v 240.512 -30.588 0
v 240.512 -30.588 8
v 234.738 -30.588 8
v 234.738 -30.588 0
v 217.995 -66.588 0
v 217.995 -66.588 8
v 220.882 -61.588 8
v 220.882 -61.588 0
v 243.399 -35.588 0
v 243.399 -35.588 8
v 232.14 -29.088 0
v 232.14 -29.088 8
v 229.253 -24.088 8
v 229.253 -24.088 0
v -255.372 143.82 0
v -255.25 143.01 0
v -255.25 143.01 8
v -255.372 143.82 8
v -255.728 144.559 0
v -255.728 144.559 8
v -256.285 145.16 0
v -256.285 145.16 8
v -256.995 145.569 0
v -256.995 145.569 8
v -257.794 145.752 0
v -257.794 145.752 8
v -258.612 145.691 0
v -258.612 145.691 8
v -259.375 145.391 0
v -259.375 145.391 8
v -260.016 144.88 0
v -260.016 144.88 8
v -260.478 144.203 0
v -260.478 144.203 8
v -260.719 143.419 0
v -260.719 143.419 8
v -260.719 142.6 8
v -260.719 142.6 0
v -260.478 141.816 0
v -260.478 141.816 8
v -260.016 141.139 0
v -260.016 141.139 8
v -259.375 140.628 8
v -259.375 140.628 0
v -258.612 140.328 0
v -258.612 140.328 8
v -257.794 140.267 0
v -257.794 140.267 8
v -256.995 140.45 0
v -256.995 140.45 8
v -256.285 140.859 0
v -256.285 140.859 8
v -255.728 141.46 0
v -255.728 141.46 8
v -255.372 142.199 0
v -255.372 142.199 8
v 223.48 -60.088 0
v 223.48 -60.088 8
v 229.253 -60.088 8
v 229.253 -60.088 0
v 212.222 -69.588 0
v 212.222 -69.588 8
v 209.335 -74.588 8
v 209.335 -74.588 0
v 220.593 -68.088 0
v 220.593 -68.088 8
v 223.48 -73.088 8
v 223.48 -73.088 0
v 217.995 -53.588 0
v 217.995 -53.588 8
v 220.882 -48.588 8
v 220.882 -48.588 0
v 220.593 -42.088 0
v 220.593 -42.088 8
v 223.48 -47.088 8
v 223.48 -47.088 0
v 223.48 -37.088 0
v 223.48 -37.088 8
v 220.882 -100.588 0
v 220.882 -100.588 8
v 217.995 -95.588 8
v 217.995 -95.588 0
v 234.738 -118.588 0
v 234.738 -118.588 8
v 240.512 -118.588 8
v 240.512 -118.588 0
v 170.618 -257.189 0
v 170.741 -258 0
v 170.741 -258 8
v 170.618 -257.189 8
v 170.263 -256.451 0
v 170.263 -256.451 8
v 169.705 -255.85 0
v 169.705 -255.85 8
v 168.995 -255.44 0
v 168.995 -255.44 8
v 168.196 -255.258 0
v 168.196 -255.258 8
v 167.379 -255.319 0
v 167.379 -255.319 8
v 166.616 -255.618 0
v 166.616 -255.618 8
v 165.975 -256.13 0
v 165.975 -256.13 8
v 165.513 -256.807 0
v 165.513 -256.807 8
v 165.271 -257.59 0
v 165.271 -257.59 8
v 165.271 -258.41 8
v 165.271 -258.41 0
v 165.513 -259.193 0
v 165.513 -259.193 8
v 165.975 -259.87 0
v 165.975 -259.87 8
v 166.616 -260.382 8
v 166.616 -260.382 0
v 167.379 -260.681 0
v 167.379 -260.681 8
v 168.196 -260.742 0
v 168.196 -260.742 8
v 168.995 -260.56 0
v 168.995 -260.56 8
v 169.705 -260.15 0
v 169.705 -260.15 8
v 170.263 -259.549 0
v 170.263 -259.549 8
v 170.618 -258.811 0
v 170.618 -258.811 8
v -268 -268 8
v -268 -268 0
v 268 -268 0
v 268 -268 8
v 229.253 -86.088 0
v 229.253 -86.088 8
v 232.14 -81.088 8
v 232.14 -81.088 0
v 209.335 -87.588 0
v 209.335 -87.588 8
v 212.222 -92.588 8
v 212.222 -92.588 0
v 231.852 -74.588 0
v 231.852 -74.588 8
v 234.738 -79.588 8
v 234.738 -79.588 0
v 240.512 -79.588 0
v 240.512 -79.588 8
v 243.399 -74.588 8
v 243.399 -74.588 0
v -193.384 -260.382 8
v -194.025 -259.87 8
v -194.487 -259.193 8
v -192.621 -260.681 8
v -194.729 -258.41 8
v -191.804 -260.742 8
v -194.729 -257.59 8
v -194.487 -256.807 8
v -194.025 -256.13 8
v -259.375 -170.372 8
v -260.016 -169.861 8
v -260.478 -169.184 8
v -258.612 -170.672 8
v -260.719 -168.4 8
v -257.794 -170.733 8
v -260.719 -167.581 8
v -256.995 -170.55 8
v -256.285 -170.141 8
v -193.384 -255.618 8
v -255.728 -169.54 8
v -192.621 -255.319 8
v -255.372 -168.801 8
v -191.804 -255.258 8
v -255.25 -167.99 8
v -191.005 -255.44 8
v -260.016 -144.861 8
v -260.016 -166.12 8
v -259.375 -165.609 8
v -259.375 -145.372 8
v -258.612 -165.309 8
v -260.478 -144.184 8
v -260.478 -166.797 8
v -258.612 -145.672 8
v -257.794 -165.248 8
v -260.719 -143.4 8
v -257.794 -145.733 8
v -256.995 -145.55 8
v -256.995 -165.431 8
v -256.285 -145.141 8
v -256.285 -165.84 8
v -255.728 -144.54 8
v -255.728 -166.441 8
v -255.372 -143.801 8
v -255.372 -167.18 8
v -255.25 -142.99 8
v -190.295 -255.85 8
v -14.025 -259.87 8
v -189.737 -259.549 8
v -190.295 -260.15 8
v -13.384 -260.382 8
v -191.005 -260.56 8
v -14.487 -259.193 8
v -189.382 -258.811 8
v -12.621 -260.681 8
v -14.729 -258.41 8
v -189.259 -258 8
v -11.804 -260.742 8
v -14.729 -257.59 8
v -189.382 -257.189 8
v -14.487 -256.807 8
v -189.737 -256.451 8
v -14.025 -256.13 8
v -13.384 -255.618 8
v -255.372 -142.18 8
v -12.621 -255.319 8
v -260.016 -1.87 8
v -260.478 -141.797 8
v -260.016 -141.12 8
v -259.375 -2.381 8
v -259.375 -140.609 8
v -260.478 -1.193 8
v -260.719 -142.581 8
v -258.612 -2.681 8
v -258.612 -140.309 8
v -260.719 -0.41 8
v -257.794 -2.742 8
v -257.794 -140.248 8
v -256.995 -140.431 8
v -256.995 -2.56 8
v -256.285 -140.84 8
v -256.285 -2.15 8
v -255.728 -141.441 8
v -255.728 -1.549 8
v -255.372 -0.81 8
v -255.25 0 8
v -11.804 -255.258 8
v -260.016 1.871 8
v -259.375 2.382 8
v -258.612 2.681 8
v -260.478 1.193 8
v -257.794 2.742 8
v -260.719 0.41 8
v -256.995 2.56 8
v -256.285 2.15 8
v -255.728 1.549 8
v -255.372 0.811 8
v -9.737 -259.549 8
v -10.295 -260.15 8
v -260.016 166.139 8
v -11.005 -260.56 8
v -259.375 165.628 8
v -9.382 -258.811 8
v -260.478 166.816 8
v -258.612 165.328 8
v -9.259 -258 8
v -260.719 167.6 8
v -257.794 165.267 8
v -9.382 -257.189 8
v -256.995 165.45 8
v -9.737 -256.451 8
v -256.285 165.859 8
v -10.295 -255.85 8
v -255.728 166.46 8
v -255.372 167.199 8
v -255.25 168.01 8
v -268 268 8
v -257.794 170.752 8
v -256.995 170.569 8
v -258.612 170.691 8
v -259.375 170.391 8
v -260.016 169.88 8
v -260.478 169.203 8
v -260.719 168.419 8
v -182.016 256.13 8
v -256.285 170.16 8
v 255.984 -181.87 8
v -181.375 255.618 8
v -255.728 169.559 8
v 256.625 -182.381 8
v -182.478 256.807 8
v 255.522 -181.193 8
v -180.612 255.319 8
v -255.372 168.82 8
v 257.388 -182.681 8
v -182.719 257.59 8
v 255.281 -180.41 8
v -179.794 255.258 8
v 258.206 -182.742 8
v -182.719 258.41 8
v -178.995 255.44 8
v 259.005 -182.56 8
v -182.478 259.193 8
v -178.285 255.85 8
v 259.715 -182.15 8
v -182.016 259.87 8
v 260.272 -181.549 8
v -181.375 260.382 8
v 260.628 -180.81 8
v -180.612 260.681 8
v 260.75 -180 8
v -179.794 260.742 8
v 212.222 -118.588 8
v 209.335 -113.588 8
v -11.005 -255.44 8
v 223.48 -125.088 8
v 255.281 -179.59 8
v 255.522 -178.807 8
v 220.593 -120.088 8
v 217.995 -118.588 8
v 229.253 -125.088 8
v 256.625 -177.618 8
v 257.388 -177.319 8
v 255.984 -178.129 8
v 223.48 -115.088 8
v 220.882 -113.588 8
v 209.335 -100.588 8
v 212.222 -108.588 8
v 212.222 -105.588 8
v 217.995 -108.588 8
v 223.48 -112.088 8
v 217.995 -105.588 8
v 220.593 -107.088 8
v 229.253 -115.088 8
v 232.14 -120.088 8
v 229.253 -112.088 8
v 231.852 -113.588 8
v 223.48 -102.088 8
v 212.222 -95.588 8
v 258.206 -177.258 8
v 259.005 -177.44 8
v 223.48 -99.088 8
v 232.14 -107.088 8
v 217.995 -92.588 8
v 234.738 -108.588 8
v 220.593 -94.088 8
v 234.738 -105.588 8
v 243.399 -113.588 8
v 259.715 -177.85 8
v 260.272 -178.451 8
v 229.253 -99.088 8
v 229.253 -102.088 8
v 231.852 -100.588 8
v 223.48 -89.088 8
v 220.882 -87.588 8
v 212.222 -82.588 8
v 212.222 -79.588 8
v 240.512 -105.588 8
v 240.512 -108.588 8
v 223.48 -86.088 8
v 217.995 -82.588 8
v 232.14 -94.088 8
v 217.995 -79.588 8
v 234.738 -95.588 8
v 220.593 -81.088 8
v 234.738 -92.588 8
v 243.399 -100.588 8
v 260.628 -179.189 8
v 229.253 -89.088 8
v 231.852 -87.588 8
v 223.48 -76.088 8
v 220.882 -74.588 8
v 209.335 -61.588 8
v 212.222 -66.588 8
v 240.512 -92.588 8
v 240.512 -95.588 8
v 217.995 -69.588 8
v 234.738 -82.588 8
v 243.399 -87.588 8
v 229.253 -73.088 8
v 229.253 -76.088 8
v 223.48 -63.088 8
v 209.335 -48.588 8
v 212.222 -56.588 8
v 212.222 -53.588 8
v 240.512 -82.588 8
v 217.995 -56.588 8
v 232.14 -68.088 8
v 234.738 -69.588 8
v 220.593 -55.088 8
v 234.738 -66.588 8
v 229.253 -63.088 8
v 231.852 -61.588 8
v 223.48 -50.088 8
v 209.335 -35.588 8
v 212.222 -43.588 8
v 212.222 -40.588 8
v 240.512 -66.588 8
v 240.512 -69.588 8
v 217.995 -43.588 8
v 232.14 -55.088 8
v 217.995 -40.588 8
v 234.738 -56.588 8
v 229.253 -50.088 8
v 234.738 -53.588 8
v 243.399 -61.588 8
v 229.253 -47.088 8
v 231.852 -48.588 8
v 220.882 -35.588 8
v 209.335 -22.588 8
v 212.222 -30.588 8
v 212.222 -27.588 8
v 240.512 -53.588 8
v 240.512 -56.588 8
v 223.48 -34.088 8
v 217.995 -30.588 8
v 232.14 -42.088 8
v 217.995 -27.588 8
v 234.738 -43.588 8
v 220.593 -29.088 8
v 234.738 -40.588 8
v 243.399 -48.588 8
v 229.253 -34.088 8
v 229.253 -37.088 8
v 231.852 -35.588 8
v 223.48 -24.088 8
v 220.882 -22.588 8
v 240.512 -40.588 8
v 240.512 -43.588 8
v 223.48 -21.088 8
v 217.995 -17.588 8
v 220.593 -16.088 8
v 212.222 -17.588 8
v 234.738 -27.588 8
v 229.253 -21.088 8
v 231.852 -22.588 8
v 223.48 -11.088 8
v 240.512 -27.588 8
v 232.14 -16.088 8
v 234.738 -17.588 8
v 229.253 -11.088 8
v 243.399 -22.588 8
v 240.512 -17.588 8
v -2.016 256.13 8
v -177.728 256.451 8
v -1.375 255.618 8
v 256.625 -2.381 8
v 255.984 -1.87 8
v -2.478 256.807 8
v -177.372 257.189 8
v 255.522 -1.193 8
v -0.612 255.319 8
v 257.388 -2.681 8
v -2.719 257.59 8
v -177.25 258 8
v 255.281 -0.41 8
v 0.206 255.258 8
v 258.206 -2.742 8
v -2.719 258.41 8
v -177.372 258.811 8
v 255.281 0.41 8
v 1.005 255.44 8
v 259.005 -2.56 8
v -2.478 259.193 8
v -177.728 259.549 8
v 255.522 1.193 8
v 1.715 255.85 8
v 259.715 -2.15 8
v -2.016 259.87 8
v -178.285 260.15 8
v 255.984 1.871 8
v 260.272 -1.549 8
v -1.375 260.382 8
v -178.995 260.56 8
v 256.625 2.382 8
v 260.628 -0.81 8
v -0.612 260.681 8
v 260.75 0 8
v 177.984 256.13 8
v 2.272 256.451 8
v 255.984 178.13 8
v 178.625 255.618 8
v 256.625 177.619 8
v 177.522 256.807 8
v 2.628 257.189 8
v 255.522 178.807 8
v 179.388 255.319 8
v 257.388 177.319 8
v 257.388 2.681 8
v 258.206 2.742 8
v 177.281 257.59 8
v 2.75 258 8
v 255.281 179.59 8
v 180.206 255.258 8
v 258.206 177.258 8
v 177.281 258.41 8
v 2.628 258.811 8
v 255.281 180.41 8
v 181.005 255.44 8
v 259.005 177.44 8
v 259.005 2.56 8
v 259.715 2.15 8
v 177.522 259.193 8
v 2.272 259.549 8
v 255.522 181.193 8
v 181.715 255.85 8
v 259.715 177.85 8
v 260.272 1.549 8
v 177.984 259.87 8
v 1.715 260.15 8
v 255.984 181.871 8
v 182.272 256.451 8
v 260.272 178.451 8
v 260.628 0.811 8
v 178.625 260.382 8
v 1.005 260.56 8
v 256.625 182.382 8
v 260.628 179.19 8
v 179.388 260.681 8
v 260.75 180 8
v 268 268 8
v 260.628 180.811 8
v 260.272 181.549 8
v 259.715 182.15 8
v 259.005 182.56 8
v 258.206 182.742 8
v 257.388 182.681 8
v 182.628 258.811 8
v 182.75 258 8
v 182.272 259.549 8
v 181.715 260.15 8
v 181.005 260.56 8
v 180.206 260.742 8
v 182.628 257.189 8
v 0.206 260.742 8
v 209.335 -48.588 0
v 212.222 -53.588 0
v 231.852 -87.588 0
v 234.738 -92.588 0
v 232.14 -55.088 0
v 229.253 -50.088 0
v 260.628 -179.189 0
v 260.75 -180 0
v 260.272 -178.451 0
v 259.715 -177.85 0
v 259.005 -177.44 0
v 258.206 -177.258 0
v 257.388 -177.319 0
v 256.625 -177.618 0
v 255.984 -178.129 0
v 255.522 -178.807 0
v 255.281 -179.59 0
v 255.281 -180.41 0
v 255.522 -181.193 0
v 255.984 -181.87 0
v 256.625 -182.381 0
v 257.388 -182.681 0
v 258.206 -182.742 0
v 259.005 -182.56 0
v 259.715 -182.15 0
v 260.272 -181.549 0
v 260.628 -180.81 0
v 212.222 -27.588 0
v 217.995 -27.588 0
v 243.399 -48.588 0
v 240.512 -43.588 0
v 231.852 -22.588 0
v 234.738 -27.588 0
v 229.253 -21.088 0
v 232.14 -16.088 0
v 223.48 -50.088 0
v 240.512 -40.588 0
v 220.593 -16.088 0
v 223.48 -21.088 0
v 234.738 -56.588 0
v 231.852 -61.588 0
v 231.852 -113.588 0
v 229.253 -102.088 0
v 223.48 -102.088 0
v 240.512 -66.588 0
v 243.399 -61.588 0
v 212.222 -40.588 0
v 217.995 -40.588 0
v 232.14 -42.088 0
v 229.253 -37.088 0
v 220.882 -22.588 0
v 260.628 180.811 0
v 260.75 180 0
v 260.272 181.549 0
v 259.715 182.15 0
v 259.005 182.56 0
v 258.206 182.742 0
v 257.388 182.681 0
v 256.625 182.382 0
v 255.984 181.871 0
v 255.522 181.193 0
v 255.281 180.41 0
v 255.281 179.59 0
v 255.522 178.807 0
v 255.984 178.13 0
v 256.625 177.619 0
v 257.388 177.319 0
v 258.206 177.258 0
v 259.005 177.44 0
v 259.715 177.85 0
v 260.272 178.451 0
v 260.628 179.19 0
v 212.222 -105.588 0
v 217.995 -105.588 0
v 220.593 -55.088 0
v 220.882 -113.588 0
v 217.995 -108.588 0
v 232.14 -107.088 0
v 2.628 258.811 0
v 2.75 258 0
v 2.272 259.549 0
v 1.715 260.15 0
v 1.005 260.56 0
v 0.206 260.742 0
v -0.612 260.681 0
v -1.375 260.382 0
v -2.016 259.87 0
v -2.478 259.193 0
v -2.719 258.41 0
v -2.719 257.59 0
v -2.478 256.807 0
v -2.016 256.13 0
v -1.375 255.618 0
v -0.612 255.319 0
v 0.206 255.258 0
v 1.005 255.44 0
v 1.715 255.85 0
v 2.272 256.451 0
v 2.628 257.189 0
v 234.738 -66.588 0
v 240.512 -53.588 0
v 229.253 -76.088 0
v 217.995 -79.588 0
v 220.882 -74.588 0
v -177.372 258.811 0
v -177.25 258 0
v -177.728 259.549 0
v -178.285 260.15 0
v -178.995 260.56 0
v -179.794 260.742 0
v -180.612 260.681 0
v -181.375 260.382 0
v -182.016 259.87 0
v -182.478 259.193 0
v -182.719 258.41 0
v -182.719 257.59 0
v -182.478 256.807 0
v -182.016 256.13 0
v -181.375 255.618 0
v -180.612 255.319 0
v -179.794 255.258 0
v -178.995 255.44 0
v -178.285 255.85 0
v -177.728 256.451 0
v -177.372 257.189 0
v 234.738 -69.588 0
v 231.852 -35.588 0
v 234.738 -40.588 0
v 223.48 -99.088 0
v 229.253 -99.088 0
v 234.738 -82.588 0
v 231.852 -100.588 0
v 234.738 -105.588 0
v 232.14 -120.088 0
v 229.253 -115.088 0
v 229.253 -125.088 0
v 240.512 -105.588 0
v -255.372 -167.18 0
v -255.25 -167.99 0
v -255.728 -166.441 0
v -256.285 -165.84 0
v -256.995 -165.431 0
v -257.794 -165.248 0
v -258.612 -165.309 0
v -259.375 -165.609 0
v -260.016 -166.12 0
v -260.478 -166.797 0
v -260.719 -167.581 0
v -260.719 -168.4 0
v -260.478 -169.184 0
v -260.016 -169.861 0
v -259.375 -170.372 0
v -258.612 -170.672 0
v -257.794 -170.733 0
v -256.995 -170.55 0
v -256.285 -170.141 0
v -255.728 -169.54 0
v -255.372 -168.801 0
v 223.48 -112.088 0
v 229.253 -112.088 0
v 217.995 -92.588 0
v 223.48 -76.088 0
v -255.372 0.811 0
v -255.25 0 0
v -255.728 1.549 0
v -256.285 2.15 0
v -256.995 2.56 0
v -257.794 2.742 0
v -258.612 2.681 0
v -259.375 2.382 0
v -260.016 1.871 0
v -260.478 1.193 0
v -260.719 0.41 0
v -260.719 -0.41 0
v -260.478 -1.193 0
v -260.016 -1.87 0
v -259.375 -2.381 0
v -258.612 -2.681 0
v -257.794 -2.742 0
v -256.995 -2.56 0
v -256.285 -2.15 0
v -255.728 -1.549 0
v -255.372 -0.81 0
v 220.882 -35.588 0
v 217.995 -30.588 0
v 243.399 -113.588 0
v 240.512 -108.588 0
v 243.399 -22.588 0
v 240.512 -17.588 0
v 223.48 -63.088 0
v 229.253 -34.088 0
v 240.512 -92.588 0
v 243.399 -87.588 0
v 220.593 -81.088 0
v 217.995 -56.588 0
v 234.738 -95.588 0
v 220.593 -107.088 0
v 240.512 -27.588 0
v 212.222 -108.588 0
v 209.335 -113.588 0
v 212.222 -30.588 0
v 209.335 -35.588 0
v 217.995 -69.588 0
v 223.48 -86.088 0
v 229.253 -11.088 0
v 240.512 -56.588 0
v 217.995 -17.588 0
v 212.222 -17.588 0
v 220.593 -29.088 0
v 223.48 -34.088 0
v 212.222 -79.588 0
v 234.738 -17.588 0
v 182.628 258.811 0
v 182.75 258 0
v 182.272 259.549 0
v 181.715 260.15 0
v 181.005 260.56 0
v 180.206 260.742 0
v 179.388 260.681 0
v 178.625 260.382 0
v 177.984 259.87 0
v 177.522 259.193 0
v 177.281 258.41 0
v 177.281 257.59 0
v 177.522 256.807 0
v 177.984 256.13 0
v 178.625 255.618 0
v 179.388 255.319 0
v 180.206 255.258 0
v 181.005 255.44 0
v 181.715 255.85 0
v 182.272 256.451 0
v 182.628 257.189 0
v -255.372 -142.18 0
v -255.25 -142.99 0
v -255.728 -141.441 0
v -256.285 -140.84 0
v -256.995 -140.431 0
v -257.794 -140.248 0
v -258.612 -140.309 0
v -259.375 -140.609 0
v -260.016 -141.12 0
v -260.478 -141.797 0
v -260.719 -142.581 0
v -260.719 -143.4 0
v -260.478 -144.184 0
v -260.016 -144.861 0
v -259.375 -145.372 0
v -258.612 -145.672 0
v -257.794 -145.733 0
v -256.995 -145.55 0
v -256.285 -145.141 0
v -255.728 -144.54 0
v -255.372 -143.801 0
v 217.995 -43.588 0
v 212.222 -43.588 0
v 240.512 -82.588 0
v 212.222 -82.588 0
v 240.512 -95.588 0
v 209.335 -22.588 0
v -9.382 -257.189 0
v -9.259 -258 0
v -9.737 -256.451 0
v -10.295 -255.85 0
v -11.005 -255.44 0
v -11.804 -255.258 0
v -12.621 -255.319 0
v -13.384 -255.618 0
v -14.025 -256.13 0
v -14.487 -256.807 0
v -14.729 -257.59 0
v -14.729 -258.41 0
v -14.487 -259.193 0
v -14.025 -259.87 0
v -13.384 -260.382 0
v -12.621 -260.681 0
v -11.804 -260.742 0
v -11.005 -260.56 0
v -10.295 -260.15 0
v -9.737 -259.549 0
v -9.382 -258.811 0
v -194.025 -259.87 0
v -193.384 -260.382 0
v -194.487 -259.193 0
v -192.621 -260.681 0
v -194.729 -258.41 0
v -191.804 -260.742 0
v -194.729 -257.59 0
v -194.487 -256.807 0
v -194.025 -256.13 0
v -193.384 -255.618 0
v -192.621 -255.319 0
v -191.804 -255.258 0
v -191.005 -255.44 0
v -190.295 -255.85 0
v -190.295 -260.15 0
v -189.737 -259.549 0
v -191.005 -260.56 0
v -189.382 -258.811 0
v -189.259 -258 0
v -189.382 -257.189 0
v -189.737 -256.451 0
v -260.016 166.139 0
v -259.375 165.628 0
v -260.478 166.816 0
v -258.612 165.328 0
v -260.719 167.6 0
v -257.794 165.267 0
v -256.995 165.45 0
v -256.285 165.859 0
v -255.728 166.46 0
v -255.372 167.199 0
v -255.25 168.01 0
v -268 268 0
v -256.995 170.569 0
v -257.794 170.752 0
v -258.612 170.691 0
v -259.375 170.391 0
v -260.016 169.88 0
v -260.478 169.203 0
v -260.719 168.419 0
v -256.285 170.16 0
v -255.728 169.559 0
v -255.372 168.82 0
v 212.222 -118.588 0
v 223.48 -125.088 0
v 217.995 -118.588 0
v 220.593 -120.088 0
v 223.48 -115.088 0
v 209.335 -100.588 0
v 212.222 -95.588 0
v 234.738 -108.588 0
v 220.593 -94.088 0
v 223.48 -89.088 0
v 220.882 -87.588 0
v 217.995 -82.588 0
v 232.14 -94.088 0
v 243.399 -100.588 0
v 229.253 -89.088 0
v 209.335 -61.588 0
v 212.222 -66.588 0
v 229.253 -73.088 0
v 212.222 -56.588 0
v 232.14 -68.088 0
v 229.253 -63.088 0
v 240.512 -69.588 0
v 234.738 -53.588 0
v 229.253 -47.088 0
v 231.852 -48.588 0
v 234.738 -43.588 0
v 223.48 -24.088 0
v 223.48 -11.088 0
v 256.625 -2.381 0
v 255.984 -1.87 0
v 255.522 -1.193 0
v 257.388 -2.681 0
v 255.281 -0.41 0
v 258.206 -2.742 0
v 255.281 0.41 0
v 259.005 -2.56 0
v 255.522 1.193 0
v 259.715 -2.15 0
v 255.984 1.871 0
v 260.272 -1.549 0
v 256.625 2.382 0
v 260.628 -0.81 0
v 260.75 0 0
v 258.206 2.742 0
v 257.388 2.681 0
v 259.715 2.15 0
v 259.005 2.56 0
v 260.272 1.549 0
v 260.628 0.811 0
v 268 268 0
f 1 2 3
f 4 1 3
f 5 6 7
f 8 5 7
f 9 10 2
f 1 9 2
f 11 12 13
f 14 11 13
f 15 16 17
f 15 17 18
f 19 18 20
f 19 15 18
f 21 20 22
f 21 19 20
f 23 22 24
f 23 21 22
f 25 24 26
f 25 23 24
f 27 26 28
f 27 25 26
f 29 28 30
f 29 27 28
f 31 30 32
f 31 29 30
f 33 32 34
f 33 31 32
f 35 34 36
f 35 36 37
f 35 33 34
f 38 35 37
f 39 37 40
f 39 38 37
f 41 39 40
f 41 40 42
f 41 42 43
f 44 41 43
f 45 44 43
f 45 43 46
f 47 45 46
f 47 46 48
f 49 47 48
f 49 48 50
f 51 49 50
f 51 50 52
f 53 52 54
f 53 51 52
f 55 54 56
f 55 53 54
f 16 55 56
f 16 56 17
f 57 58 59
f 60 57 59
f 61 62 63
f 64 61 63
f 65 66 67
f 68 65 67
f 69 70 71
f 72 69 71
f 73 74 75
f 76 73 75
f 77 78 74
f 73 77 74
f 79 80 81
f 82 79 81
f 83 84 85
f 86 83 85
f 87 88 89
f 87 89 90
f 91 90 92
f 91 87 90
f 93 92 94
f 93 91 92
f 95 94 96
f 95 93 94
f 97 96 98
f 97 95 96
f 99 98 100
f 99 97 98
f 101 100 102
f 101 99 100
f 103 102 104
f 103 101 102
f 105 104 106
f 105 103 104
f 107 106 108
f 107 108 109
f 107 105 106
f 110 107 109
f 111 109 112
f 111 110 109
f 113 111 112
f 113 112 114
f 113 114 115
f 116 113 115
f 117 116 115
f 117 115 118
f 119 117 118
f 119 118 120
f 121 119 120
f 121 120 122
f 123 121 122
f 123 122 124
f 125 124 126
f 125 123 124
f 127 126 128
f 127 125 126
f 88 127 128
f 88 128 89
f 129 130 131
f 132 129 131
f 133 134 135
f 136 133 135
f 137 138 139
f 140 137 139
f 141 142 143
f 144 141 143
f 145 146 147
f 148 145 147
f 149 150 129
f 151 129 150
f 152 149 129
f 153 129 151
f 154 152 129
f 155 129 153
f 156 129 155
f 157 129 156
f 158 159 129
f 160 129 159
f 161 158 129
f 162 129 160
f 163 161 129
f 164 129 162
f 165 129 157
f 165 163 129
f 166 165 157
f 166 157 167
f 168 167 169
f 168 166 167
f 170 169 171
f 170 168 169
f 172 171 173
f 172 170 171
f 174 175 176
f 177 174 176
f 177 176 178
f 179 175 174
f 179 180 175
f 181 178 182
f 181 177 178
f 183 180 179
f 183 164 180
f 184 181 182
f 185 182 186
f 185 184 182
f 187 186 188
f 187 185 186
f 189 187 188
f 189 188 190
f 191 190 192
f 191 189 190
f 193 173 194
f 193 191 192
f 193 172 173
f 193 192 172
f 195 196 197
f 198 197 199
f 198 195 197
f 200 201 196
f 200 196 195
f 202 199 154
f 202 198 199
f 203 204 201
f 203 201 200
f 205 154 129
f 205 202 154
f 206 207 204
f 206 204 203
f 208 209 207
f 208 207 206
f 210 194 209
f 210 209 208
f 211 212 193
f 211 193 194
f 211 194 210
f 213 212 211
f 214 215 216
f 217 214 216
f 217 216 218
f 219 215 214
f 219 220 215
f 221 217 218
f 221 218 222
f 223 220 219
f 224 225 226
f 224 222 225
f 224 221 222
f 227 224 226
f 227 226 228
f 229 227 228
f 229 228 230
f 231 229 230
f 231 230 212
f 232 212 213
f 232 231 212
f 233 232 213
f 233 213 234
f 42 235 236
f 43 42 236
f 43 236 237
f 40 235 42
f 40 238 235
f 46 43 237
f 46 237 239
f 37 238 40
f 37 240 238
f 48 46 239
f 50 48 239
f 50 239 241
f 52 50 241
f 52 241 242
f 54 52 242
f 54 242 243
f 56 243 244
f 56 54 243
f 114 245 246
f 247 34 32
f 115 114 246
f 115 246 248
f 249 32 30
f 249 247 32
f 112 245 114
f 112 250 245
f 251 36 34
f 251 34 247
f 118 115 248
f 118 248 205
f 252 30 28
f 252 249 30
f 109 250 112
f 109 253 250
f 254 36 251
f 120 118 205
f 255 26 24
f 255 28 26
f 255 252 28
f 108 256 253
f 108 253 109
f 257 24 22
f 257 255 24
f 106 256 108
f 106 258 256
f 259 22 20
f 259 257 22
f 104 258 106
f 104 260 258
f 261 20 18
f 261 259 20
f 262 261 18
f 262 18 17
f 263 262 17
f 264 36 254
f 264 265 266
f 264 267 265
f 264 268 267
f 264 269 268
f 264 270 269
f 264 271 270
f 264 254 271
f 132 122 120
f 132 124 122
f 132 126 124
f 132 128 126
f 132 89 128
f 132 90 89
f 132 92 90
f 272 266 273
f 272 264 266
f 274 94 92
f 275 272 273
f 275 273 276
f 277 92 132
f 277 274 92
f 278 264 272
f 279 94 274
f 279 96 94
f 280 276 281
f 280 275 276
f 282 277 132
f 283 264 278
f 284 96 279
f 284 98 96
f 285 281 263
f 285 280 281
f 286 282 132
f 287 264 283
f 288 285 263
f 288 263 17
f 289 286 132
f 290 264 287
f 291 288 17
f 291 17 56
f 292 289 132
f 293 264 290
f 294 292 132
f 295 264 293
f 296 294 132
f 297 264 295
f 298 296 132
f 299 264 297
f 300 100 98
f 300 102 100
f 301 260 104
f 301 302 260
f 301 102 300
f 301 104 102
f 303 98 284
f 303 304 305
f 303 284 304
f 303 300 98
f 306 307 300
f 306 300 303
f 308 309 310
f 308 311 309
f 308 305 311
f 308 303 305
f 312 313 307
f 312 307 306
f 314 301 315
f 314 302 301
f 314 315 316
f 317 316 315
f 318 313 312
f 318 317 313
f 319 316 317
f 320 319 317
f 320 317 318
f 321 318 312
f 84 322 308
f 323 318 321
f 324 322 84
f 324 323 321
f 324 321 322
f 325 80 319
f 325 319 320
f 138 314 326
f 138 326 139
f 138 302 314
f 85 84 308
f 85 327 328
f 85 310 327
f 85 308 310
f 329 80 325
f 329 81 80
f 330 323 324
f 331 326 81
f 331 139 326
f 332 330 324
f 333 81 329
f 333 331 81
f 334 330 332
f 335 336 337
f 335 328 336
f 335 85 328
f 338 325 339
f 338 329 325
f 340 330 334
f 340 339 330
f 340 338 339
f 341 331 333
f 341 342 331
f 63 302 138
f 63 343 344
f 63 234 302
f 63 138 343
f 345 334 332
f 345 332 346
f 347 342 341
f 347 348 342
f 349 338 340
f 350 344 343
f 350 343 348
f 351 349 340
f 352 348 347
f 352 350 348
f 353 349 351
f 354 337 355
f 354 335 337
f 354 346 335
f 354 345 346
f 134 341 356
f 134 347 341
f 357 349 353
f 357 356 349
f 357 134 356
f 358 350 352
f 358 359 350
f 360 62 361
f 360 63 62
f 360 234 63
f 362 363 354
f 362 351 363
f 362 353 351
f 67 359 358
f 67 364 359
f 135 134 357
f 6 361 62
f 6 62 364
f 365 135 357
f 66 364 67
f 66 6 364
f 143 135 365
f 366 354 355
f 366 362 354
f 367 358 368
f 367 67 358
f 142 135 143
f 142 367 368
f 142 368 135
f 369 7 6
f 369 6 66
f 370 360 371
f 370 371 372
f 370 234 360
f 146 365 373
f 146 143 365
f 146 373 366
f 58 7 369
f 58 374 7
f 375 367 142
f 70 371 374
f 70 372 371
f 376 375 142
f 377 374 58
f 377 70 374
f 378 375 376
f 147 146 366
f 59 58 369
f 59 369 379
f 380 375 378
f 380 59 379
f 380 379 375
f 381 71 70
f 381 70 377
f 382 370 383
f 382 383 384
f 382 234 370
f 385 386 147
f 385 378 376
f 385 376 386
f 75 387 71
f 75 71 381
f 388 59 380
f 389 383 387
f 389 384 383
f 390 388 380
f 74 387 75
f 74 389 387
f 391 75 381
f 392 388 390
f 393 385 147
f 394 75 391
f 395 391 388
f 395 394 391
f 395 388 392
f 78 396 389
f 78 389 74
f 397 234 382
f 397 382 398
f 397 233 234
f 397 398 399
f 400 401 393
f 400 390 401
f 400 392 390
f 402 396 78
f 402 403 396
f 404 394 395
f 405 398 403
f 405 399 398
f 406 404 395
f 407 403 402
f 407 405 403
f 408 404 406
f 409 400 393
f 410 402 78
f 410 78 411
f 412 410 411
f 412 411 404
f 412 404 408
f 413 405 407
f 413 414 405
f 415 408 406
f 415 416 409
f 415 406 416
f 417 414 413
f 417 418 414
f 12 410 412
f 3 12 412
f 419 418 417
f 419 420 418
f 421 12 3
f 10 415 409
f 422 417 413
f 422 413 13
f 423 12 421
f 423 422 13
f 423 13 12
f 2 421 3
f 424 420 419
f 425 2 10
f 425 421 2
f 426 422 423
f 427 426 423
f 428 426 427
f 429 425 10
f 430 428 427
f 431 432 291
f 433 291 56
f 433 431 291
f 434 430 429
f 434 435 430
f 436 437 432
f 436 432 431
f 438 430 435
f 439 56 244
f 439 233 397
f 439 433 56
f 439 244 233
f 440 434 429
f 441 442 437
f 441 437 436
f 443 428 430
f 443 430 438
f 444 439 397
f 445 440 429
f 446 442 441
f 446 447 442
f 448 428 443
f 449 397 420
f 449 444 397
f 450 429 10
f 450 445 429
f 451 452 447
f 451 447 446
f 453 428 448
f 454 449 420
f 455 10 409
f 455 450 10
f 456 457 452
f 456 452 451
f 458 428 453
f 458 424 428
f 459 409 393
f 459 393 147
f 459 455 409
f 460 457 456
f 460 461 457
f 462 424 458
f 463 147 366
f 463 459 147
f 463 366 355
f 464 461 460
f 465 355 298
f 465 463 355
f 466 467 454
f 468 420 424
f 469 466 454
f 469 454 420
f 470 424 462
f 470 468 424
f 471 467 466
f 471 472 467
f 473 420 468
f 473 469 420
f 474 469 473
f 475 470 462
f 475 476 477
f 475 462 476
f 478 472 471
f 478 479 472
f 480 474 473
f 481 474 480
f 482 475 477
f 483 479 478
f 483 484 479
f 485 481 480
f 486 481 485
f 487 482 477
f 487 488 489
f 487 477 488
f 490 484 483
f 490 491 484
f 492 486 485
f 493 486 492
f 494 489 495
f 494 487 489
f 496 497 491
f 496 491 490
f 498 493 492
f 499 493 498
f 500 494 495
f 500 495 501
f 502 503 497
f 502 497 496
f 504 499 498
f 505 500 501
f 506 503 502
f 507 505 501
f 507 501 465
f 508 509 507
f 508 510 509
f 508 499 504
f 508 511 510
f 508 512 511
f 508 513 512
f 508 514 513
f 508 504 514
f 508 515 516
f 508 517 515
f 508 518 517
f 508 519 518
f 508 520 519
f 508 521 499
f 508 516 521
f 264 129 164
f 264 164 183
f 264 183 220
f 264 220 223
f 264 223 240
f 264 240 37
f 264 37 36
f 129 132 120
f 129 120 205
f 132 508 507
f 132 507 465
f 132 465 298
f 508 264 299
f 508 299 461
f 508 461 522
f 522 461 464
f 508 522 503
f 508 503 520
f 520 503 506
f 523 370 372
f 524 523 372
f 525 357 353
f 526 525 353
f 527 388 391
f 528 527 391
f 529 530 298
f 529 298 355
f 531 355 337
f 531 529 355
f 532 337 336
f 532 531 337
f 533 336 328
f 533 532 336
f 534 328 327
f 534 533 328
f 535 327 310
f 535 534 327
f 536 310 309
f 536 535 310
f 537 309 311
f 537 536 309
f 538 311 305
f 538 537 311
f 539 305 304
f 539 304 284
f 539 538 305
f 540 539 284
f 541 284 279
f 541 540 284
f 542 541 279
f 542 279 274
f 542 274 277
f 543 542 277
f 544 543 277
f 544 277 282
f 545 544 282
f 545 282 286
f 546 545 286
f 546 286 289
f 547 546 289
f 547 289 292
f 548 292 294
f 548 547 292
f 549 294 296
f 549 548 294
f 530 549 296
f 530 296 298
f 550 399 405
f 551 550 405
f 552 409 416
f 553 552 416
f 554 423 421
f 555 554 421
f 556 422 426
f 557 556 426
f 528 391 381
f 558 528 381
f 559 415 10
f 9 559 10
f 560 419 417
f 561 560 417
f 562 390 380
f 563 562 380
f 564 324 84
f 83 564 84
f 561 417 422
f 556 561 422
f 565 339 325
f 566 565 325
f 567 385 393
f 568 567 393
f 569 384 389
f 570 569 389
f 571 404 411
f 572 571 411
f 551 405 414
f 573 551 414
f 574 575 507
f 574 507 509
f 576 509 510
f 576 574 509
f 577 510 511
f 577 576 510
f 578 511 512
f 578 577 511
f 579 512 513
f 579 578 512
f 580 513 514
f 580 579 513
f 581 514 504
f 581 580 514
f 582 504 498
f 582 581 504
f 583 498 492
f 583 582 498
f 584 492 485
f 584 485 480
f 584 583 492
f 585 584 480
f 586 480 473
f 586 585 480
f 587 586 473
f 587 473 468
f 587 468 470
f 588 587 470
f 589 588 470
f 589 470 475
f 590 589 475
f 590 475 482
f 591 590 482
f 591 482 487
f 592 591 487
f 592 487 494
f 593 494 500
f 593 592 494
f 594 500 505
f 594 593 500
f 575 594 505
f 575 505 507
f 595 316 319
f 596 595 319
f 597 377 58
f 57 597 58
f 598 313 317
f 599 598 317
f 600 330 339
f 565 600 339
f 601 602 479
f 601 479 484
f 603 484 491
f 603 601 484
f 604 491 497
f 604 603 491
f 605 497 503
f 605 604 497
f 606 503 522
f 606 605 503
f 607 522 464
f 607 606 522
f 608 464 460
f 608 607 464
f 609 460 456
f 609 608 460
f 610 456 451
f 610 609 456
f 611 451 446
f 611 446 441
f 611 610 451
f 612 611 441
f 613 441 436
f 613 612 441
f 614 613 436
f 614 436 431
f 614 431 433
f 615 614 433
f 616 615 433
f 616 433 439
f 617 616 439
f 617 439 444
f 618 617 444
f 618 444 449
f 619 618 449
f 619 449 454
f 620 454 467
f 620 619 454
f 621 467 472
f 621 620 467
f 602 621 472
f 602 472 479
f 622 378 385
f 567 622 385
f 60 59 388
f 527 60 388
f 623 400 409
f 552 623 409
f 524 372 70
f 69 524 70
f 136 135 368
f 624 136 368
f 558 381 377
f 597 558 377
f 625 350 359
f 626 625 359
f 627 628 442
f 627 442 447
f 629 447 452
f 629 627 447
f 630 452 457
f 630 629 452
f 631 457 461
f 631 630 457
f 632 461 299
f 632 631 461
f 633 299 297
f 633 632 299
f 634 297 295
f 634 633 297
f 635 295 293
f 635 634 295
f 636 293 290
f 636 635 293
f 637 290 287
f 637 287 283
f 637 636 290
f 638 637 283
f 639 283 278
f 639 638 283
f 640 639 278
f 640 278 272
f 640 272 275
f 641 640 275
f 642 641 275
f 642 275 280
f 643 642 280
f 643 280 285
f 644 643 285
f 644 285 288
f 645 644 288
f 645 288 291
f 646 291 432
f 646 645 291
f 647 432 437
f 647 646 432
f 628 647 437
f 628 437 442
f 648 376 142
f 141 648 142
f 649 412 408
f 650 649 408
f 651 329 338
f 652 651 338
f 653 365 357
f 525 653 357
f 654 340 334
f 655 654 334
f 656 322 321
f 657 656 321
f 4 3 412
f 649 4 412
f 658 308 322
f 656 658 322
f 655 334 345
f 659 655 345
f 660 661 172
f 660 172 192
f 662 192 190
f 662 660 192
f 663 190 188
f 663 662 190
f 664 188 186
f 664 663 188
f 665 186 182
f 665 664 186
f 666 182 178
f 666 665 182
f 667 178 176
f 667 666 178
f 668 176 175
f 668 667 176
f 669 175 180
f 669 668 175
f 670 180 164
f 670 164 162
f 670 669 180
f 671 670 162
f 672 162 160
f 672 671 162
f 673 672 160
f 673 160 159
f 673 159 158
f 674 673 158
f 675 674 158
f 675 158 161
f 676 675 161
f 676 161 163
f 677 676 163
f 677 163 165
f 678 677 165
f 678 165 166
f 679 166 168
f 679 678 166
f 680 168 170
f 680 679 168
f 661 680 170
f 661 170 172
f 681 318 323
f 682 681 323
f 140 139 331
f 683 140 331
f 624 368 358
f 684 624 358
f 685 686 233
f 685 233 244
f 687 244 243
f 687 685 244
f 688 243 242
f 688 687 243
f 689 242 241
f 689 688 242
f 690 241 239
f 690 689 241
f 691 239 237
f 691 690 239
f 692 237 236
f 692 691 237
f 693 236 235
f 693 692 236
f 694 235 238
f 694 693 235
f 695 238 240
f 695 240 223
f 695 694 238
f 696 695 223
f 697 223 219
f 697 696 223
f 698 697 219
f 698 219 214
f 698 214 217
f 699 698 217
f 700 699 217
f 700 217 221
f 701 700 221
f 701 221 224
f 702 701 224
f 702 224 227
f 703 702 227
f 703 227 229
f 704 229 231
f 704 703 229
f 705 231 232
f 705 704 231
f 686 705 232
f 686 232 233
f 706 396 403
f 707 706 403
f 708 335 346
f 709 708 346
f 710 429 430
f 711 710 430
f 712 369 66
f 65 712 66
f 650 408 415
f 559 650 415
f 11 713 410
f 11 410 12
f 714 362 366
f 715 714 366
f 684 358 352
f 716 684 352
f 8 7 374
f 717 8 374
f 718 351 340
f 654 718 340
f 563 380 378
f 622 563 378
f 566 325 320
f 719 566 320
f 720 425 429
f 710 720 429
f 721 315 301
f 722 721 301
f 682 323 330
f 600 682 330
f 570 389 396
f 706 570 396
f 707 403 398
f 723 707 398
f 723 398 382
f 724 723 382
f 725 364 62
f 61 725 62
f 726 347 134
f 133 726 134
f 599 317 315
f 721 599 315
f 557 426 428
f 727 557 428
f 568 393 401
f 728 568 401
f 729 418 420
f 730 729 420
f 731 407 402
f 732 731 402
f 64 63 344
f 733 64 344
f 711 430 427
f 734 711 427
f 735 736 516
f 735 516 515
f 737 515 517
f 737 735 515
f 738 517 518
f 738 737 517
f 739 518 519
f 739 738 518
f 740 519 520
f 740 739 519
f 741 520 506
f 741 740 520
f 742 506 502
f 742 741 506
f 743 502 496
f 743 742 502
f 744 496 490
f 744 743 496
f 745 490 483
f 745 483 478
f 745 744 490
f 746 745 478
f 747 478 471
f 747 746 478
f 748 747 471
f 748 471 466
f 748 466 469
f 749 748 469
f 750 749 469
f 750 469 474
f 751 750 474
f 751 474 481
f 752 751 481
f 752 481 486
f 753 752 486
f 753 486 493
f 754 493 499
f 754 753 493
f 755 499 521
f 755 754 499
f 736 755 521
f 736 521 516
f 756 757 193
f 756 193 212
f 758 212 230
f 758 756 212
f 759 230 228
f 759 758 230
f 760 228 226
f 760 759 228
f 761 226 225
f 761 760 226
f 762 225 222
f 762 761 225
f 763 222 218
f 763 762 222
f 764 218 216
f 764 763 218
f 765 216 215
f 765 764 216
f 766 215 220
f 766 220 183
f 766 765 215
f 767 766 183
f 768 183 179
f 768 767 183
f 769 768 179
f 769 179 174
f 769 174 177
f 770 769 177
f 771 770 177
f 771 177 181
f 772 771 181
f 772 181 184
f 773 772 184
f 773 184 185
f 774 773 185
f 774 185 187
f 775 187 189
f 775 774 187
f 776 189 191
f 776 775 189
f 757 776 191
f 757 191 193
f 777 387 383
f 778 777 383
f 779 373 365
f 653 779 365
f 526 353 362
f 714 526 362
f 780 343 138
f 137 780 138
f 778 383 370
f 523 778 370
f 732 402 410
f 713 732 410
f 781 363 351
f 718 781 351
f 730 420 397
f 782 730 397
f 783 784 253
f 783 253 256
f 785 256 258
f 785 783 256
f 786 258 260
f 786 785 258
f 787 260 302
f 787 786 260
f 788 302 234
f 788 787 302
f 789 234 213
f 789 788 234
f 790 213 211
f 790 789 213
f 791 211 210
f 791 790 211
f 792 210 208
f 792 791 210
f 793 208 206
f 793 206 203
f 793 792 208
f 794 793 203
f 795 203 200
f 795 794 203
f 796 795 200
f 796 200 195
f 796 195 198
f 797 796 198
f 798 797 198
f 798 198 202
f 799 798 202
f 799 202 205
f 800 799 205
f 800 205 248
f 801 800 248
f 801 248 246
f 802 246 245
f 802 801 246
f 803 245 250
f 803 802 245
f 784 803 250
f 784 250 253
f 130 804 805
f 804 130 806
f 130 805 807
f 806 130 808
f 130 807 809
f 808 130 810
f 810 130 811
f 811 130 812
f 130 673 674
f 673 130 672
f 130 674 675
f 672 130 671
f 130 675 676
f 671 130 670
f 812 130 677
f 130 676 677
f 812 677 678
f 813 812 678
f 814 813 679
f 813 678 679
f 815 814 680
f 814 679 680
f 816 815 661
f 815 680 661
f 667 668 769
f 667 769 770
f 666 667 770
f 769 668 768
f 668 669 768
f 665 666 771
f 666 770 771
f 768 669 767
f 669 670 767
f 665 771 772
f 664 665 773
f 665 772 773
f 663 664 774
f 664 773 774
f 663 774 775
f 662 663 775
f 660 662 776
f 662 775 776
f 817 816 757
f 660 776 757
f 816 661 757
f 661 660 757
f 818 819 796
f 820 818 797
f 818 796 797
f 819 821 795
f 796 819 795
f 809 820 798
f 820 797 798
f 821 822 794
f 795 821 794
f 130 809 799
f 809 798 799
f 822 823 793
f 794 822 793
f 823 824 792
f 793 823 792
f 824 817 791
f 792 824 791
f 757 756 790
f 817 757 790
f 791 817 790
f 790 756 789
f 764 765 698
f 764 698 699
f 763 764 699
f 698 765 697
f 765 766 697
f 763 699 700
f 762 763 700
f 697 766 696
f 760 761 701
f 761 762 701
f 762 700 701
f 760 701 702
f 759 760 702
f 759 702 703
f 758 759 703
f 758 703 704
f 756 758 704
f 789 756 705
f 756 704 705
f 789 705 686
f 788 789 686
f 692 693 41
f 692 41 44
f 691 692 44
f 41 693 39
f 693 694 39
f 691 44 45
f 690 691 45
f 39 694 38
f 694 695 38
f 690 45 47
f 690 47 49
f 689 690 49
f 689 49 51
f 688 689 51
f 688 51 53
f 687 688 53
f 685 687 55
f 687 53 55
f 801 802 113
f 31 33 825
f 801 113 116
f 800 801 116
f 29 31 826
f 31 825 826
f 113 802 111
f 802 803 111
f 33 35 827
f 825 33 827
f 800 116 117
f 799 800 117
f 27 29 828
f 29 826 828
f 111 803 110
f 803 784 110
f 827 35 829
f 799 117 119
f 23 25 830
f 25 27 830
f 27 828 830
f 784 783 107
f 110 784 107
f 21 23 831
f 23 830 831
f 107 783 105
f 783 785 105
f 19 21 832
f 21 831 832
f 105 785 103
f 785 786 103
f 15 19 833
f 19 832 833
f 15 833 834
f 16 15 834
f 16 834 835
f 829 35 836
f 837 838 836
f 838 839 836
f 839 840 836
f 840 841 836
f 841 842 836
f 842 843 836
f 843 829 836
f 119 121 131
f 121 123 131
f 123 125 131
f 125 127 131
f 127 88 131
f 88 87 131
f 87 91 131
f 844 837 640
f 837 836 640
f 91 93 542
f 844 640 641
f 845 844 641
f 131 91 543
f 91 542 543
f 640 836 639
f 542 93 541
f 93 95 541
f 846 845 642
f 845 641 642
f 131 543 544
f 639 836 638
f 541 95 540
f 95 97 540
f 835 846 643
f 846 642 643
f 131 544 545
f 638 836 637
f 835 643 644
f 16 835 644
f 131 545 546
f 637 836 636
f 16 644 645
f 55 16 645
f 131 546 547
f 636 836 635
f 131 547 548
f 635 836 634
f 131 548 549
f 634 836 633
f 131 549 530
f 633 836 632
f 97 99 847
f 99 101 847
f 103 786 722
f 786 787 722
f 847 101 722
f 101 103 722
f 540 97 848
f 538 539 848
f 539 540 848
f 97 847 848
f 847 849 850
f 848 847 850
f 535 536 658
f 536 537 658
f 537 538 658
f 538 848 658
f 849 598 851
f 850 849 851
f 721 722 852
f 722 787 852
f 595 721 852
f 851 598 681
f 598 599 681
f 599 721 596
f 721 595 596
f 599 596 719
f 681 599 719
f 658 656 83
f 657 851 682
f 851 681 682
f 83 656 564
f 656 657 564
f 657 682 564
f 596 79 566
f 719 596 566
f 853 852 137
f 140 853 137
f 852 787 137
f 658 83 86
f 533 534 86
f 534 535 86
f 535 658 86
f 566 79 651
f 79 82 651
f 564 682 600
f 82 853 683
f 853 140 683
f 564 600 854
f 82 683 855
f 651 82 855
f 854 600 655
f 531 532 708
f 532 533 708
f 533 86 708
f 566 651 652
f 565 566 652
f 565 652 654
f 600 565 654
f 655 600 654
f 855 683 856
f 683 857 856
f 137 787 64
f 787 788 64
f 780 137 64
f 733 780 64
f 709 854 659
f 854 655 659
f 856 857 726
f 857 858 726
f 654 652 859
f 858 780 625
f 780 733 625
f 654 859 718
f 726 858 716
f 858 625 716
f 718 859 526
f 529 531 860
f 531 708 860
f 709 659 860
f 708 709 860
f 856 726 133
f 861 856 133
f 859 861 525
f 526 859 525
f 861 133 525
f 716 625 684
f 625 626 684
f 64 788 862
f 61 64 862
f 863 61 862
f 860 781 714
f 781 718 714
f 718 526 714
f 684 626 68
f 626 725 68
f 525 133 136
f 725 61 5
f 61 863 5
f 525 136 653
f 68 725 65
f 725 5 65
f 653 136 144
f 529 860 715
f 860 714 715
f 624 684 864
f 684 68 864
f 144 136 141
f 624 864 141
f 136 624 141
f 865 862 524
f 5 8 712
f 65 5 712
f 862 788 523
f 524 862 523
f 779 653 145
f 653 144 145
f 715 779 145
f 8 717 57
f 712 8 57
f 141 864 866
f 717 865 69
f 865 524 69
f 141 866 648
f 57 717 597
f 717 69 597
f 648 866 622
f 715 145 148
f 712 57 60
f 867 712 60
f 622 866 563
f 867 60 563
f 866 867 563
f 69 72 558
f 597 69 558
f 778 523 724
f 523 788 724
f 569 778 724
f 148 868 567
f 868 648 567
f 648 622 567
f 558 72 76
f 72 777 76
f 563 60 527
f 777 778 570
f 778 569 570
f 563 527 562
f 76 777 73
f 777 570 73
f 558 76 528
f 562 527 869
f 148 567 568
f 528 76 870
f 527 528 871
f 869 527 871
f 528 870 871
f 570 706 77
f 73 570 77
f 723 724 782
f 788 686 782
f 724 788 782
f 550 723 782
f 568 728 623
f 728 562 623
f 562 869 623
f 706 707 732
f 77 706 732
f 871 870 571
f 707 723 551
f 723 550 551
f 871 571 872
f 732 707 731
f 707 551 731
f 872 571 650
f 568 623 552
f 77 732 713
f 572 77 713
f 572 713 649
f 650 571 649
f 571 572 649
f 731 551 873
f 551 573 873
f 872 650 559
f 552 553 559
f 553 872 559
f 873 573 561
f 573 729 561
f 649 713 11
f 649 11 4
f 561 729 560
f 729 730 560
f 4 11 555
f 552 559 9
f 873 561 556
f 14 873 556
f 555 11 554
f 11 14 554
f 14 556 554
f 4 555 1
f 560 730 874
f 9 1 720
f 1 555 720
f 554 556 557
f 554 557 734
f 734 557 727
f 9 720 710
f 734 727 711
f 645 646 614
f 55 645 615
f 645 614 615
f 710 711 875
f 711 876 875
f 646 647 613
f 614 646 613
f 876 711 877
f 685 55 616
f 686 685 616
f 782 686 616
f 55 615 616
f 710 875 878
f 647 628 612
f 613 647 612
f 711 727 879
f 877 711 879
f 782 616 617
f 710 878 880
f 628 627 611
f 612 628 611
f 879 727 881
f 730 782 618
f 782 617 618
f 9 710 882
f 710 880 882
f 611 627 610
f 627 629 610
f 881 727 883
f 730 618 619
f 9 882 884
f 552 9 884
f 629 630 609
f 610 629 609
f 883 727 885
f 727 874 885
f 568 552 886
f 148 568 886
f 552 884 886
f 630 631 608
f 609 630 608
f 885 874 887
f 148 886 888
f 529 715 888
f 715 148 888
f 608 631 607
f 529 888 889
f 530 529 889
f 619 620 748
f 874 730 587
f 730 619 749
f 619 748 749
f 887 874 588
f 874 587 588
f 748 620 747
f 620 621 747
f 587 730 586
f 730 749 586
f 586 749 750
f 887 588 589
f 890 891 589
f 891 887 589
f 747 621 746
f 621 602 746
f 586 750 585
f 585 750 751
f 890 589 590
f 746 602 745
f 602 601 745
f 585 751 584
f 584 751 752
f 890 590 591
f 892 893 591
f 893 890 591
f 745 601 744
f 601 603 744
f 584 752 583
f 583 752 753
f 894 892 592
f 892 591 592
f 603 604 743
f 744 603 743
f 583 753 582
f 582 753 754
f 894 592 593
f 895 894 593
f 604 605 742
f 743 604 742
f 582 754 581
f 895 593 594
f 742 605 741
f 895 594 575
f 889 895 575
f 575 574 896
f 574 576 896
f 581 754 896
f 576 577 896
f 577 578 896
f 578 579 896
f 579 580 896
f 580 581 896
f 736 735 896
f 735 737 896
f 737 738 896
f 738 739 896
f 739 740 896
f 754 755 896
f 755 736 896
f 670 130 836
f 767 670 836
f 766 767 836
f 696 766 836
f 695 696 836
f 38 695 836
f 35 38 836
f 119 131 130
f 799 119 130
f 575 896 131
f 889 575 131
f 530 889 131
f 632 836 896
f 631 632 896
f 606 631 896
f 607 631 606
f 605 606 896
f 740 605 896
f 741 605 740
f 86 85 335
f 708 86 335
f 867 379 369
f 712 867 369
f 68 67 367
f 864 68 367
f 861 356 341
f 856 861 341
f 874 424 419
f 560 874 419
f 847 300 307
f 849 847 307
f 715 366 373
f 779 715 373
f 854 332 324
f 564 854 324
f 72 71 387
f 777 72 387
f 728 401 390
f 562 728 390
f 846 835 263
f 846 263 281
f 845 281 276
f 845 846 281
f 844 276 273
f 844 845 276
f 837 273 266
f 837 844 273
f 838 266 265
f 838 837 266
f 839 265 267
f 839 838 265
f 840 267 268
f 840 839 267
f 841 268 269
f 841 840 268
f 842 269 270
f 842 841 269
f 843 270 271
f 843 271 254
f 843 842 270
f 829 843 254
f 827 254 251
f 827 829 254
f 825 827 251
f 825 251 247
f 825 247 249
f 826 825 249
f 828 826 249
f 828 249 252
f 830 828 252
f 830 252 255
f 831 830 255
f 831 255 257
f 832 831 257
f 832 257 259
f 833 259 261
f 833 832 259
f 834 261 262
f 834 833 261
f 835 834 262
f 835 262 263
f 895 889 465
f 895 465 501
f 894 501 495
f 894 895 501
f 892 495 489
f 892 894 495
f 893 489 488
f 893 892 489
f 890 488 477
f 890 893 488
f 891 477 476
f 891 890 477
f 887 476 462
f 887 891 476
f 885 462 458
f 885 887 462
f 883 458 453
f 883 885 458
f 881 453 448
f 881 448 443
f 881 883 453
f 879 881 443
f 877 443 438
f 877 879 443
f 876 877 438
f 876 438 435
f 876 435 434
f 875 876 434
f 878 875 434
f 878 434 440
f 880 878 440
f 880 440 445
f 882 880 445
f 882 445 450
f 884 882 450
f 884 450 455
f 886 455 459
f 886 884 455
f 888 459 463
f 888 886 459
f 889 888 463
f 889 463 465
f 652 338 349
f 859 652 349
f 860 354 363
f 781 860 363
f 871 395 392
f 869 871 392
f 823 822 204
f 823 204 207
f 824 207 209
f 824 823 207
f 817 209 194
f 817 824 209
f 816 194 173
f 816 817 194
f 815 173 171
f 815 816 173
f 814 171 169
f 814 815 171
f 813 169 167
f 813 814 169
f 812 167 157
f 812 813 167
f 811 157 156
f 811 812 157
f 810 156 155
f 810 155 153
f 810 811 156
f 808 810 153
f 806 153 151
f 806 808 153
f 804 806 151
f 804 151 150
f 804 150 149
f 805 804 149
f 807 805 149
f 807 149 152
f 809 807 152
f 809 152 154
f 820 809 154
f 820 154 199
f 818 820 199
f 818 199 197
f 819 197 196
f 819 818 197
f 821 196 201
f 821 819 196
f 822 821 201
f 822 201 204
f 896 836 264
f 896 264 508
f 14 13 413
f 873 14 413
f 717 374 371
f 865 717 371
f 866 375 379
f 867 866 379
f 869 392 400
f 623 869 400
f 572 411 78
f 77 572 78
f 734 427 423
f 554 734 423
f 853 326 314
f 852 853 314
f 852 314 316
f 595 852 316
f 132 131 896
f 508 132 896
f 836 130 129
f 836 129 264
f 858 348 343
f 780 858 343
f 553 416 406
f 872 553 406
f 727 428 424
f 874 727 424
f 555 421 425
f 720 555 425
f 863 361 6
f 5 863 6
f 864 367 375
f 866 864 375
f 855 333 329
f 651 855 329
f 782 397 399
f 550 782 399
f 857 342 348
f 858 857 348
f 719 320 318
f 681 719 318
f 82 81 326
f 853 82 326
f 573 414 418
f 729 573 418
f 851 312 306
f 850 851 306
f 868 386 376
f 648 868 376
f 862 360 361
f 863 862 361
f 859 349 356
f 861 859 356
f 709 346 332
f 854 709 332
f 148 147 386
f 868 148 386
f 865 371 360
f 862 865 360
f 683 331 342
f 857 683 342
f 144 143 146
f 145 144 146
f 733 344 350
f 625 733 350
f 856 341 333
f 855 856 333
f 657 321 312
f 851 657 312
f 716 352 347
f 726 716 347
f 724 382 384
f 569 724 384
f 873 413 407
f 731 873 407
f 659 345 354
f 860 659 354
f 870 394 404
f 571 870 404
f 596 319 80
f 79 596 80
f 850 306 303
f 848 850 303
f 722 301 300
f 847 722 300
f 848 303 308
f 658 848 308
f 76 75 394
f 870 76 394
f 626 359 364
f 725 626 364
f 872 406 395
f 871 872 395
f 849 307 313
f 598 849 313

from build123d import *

# Parameters (mm, degrees)
SKETCH1_W           = 536
SKETCH1_H           = 536
SKETCH1_R           = 2.75
SKETCH1_R_2         = 2.749999922
SKETCH1_R_3         = 2.749999896
BOSS_EXTRUDE1_DEPTH = 8
CUT_EXTRUDE4_DEPTH  = 10


with BuildPart() as part:
    # Sketch1 → Boss-Extrude1 (new body)
    with BuildSketch(Plane.XY):
        Rectangle(SKETCH1_W, SKETCH1_H)
        with Locations((0, 258)):
            Circle(SKETCH1_R, mode=Mode.SUBTRACT)
        with Locations((-180, 258)):
            Circle(SKETCH1_R, mode=Mode.SUBTRACT)
        with Locations((180, 258)):
            Circle(SKETCH1_R, mode=Mode.SUBTRACT)
        with Locations((258, 7.8072e-05)):
            Circle(SKETCH1_R, mode=Mode.SUBTRACT)
        with Locations((258, 180.000078072)):
            Circle(SKETCH1_R, mode=Mode.SUBTRACT)
        with Locations((258, -179.999921928)):
            Circle(SKETCH1_R, mode=Mode.SUBTRACT)
        with Locations((-12.009451925, -258)):
            Circle(SKETCH1_R, mode=Mode.SUBTRACT)
        with Locations((167.990548075, -258)):
            Circle(SKETCH1_R, mode=Mode.SUBTRACT)
        with Locations((-192.009451925, -258)):
            Circle(SKETCH1_R, mode=Mode.SUBTRACT)
        with Locations((-257.999921928, 7.8072e-05)):
            Circle(SKETCH1_R, mode=Mode.SUBTRACT)
        with Locations((-257.999921928, -167.990470003)):
            Circle(SKETCH1_R, mode=Mode.SUBTRACT)
        with Locations((-257.999921928, 168.009529997)):
            Circle(SKETCH1_R, mode=Mode.SUBTRACT)
        with Locations((-257.999921928, 143.009529997)):
            Circle(SKETCH1_R_2, mode=Mode.SUBTRACT)
        with Locations((-257.999921928, -142.990471748)):
            Circle(SKETCH1_R_3, mode=Mode.SUBTRACT)
    extrude(amount=BOSS_EXTRUDE1_DEPTH)

    # Sketch3 → Cut-Extrude4 (cut)
    with BuildSketch(Plane.XY.offset(8)):
        Polygon((243.398526366, -22.587571342), (240.511775021, -17.587571342), (234.738272329, -17.587571342), (231.851520983, -22.587571342), (234.738272329, -27.587571342), (240.511775021, -27.587571342), align=None)
        Polygon((220.881865868, -22.587571342), (217.995114522, -17.587571342), (212.22161183, -17.587571342), (209.334860484, -22.587571342), (212.22161183, -27.587571342), (217.995114522, -27.587571342), align=None)
        Polygon((232.140196117, -29.087571342), (229.253444771, -24.087571342), (223.479942079, -24.087571342), (220.593190733, -29.087571342), (223.479942079, -34.087571342), (229.253444771, -34.087571342), align=None)
        Polygon((232.140196117, -16.087571342), (229.253444771, -11.087571342), (223.479942079, -11.087571342), (220.593190733, -16.087571342), (223.479942079, -21.087571342), (229.253444771, -21.087571342), align=None)
        Polygon((243.398526366, -35.587571342), (240.511775021, -30.587571342), (234.738272329, -30.587571342), (231.851520983, -35.587571342), (234.738272329, -40.587571342), (240.511775021, -40.587571342), align=None)
        Polygon((220.881865868, -35.587571342), (217.995114522, -30.587571342), (212.22161183, -30.587571342), (209.334860484, -35.587571342), (212.22161183, -40.587571342), (217.995114522, -40.587571342), align=None)
        Polygon((232.140196117, -42.087571342), (229.253444771, -37.087571342), (223.479942079, -37.087571342), (220.593190733, -42.087571342), (223.479942079, -47.087571342), (229.253444771, -47.087571342), align=None)
        Polygon((243.398526366, -48.587571342), (240.511775021, -43.587571342), (234.738272329, -43.587571342), (231.851520983, -48.587571342), (234.738272329, -53.587571342), (240.511775021, -53.587571342), align=None)
        Polygon((220.881865868, -48.587571342), (217.995114522, -43.587571342), (212.22161183, -43.587571342), (209.334860484, -48.587571342), (212.22161183, -53.587571342), (217.995114522, -53.587571342), align=None)
        Polygon((232.140196117, -55.087571342), (229.253444771, -50.087571342), (223.479942079, -50.087571342), (220.593190733, -55.087571342), (223.479942079, -60.087571342), (229.253444771, -60.087571342), align=None)
        Polygon((243.398526366, -61.587571342), (240.511775021, -56.587571342), (234.738272329, -56.587571342), (231.851520983, -61.587571342), (234.738272329, -66.587571342), (240.511775021, -66.587571342), align=None)
        Polygon((220.881865868, -61.587571342), (217.995114522, -56.587571342), (212.22161183, -56.587571342), (209.334860484, -61.587571342), (212.22161183, -66.587571342), (217.995114522, -66.587571342), align=None)
        Polygon((232.140196117, -68.087571342), (229.253444771, -63.087571342), (223.479942079, -63.087571342), (220.593190733, -68.087571342), (223.479942079, -73.087571342), (229.253444771, -73.087571342), align=None)
        Polygon((243.398526366, -74.587571342), (240.511775021, -69.587571342), (234.738272329, -69.587571342), (231.851520983, -74.587571342), (234.738272329, -79.587571342), (240.511775021, -79.587571342), align=None)
        Polygon((220.881865868, -74.587571342), (217.995114522, -69.587571342), (212.22161183, -69.587571342), (209.334860484, -74.587571342), (212.22161183, -79.587571342), (217.995114522, -79.587571342), align=None)
        Polygon((232.140196117, -81.087571342), (229.253444771, -76.087571342), (223.479942079, -76.087571342), (220.593190733, -81.087571342), (223.479942079, -86.087571342), (229.253444771, -86.087571342), align=None)
        Polygon((243.398526366, -87.587571342), (240.511775021, -82.587571342), (234.738272329, -82.587571342), (231.851520983, -87.587571342), (234.738272329, -92.587571342), (240.511775021, -92.587571342), align=None)
        Polygon((220.881865868, -87.587571342), (217.995114522, -82.587571342), (212.22161183, -82.587571342), (209.334860484, -87.587571342), (212.22161183, -92.587571342), (217.995114522, -92.587571342), align=None)
        Polygon((232.140196117, -94.087571342), (229.253444771, -89.087571342), (223.479942079, -89.087571342), (220.593190733, -94.087571342), (223.479942079, -99.087571342), (229.253444771, -99.087571342), align=None)
        Polygon((243.398526366, -100.587571342), (240.511775021, -95.587571342), (234.738272329, -95.587571342), (231.851520983, -100.587571342), (234.738272329, -105.587571342), (240.511775021, -105.587571342), align=None)
        Polygon((220.881865868, -100.587571342), (217.995114522, -95.587571342), (212.22161183, -95.587571342), (209.334860484, -100.587571342), (212.22161183, -105.587571342), (217.995114522, -105.587571342), align=None)
        Polygon((232.140196117, -107.087571342), (229.253444771, -102.087571342), (223.479942079, -102.087571342), (220.593190733, -107.087571342), (223.479942079, -112.087571342), (229.253444771, -112.087571342), align=None)
        Polygon((243.398526366, -113.587571342), (240.511775021, -108.587571342), (234.738272329, -108.587571342), (231.851520983, -113.587571342), (234.738272329, -118.587571342), (240.511775021, -118.587571342), align=None)
        Polygon((220.881865868, -113.587571342), (217.995114522, -108.587571342), (212.22161183, -108.587571342), (209.334860484, -113.587571342), (212.22161183, -118.587571342), (217.995114522, -118.587571342), align=None)
        Polygon((232.140196117, -120.087571342), (229.253444771, -115.087571342), (223.479942079, -115.087571342), (220.593190733, -120.087571342), (223.479942079, -125.087571342), (229.253444771, -125.087571342), align=None)
    extrude(amount=-CUT_EXTRUDE4_DEPTH, mode=Mode.SUBTRACT)


solid = part.part
